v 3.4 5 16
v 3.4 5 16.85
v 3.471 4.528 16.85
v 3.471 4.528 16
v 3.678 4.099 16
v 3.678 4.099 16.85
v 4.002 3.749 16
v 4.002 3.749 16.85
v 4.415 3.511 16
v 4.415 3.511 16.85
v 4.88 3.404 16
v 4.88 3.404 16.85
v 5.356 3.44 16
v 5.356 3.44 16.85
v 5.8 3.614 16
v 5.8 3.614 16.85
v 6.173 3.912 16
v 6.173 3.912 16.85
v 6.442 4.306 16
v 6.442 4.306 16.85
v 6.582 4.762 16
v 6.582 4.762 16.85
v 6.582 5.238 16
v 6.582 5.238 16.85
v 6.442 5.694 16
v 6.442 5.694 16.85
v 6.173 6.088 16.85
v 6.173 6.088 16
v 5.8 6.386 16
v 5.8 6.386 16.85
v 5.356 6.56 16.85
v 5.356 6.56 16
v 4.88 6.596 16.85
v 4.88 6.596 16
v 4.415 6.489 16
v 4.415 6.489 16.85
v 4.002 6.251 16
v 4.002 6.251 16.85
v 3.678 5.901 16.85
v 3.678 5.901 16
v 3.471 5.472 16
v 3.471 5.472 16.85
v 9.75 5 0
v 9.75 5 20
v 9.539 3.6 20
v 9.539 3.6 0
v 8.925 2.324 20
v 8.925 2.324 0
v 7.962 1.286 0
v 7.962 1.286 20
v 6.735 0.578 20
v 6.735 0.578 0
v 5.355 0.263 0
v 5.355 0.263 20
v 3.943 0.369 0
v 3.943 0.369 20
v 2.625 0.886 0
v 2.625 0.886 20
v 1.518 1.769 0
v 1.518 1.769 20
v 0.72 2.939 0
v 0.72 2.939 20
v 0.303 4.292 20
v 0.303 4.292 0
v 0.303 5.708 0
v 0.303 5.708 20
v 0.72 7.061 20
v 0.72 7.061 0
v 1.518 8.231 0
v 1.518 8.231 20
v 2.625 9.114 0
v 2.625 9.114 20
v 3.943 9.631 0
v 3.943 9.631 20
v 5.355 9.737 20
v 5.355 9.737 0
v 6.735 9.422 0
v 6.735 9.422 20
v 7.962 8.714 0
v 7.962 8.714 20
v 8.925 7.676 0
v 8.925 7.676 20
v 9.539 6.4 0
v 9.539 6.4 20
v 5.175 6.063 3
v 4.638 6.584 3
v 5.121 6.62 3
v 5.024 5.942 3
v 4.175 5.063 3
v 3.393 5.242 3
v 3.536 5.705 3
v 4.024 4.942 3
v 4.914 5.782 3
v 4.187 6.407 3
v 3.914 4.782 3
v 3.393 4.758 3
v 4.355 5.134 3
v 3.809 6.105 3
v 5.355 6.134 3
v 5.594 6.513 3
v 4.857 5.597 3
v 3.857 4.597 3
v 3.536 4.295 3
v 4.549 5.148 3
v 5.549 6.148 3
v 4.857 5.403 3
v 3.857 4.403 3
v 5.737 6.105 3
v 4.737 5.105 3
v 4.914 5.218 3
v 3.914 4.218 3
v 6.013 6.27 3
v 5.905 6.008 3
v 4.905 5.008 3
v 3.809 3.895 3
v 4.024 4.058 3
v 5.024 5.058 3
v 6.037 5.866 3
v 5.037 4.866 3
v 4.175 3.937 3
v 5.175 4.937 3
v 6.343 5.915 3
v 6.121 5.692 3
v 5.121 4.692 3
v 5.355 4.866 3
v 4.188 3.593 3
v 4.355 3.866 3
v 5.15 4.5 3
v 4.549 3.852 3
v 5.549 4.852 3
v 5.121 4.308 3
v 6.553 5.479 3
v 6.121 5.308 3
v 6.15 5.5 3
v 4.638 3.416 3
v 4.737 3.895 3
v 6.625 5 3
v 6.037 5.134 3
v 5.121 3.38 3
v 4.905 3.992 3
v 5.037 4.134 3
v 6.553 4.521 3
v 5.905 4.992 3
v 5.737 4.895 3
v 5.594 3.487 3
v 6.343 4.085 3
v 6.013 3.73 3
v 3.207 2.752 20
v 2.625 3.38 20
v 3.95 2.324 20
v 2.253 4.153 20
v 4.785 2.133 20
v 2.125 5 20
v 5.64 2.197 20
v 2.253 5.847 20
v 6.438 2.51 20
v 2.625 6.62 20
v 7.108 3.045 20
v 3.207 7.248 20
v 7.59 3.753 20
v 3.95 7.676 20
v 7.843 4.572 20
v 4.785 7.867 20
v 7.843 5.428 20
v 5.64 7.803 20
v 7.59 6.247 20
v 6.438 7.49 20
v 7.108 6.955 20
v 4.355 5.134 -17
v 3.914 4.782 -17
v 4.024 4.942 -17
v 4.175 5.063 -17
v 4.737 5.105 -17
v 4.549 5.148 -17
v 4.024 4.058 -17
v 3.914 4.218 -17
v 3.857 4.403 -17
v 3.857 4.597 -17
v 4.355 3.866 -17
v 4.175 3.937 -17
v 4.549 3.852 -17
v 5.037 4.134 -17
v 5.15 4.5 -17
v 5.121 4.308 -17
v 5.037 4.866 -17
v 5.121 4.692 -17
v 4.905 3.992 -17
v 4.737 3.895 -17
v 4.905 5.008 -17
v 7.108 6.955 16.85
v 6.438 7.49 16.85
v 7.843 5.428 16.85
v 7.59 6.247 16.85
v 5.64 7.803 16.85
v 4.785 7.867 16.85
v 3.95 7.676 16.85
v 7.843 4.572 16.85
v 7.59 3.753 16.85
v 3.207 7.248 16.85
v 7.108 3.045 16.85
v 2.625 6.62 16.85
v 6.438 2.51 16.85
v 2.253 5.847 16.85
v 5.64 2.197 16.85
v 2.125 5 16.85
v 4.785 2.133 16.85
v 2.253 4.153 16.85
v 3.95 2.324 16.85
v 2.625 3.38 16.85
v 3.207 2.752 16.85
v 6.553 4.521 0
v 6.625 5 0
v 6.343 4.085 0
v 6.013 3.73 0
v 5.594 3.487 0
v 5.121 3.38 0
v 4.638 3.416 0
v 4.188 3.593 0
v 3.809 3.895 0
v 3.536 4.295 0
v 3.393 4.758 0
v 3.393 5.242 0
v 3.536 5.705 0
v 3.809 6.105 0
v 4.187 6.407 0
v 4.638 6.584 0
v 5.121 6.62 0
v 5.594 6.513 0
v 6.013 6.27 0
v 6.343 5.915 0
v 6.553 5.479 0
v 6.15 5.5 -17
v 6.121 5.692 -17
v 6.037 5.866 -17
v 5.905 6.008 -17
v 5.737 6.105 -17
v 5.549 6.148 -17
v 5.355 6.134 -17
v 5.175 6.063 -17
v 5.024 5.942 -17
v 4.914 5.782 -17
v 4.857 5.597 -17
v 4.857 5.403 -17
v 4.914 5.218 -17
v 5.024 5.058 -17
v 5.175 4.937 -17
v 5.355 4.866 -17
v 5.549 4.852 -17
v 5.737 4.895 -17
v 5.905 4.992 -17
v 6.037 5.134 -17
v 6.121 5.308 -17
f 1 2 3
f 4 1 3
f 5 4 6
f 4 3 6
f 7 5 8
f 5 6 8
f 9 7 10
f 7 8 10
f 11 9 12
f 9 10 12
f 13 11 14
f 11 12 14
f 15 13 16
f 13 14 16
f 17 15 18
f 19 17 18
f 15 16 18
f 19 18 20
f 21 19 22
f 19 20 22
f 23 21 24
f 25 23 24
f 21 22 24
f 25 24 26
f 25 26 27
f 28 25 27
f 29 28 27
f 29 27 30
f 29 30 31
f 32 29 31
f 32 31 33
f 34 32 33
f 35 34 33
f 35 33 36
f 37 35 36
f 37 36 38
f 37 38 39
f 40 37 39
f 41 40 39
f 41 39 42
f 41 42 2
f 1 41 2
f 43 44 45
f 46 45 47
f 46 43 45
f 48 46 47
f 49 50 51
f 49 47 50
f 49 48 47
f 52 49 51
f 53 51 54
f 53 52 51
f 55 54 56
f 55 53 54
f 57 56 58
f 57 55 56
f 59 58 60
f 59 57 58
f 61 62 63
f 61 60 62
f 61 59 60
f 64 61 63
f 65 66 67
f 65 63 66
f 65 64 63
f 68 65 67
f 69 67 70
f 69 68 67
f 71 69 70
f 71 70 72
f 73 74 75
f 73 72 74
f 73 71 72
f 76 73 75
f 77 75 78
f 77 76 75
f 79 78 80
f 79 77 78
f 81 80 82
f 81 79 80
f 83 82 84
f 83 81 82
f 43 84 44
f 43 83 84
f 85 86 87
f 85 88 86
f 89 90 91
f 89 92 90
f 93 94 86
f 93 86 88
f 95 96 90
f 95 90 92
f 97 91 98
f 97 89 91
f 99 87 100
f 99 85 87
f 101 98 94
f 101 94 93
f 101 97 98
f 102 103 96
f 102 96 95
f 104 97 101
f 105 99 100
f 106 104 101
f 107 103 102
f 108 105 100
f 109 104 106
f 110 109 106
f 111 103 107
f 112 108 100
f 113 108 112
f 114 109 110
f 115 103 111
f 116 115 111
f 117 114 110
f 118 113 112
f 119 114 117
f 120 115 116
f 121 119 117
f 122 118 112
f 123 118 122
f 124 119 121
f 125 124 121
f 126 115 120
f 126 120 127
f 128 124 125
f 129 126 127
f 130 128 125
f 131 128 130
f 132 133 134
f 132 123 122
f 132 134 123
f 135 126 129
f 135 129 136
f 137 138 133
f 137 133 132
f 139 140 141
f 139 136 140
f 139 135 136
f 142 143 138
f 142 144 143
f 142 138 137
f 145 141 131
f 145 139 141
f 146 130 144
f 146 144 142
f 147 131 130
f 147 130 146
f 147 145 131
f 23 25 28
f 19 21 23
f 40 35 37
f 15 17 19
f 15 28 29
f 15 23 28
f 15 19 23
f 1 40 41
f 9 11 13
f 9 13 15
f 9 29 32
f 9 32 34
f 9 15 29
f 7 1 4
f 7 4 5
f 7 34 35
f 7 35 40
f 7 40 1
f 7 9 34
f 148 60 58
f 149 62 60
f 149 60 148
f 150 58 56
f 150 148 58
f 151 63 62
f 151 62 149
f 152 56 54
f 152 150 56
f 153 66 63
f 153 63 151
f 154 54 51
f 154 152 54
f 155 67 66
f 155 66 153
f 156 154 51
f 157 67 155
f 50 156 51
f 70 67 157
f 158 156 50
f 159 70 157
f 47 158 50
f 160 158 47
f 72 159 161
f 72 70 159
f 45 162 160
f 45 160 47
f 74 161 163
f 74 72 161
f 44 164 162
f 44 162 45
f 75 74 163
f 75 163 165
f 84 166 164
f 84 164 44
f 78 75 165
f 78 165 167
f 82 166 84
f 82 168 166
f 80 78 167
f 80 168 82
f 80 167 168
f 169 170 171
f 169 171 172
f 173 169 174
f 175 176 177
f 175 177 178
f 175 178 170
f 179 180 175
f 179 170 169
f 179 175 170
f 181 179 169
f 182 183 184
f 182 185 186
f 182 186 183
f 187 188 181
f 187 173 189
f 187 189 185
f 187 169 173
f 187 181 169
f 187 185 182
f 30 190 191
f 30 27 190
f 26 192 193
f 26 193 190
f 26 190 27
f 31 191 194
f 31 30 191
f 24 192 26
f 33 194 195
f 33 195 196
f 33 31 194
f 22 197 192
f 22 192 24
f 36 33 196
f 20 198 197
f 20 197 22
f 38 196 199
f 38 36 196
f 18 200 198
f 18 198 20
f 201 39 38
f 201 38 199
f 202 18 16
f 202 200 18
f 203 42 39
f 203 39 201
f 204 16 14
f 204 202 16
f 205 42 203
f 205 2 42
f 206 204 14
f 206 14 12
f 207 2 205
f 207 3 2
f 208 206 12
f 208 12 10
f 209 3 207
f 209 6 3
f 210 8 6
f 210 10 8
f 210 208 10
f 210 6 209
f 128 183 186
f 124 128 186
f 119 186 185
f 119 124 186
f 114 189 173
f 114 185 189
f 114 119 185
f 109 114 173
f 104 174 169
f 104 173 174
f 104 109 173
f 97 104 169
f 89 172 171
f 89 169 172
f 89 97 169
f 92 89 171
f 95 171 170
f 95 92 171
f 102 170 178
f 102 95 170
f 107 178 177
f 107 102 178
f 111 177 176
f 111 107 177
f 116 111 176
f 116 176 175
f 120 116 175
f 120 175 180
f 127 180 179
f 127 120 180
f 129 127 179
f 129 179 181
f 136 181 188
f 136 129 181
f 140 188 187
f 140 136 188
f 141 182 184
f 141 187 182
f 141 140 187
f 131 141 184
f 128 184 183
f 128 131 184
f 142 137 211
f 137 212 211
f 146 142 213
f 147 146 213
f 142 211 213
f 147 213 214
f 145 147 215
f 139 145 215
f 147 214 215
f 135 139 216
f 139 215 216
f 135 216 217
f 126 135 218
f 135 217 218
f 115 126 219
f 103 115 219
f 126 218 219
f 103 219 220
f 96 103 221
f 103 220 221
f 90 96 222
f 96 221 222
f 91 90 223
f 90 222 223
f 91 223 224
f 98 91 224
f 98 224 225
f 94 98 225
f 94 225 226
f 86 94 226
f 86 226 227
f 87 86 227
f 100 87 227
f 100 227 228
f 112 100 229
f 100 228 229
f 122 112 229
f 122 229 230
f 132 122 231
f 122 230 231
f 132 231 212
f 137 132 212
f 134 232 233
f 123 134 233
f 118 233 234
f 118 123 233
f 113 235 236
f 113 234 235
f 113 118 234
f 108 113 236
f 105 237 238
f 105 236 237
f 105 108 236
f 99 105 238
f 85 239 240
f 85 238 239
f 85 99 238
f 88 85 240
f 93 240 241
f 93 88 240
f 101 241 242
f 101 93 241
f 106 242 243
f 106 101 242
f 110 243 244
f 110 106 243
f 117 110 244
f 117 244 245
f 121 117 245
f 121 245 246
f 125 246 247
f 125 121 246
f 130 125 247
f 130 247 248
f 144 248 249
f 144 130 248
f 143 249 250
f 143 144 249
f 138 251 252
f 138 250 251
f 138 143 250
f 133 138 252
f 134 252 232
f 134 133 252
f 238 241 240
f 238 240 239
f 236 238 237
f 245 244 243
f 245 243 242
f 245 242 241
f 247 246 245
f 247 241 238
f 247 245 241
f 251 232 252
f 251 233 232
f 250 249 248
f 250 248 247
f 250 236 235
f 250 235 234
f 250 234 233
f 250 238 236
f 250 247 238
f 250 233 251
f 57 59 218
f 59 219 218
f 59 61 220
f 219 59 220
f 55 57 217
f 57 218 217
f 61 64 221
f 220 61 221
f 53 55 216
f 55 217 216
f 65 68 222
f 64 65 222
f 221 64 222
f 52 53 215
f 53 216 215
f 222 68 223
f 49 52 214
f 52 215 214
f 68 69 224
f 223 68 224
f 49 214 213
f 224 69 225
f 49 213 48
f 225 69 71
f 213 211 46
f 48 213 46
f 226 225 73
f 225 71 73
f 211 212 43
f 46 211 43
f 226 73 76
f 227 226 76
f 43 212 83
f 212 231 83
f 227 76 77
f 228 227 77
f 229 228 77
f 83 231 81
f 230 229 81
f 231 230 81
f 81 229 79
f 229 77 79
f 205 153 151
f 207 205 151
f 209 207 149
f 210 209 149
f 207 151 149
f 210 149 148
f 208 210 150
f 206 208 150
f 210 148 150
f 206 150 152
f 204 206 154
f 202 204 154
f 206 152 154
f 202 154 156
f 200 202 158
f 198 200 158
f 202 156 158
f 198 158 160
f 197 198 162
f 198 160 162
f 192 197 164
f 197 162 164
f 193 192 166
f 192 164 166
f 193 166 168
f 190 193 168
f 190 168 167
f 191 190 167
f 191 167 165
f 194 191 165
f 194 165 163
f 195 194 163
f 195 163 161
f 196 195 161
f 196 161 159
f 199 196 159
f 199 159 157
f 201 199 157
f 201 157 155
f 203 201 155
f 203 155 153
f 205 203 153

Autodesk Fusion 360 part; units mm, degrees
sketch "Sketch1" plane through (0, 0, 0) normal (0, 0, 1) x (1, 0, 0)
  circle A0 centre (5, 5) radius 4.75
  dimension "d1" = 9.5
extrude "Extrude1" add sketch "Sketch1" along normal blind 20
sketch "Sketch2" plane through (0, 0, 20) normal (0, 0, 1) x (-1, 0, 0)
  circle A0 centre (-5, -5) radius 4.75
  circle A1 centre (-5, -5) radius 2.875
  dimension "d4" = 5.75
extrude "Extrude2" cut sketch "Sketch2" against normal blind 3.15 contours A1
sketch "Sketch3" plane through (0, 0, 16.85) normal (0, 0, 1) x (-1, 0, 0)
  circle A0 centre (-5, -5) radius 2.875
  circle A1 centre (-5, -5) radius 1.6
  dimension "d7" = 3.2
extrude "Extrude3" cut sketch "Sketch3" against normal blind 0.85 contours A1
sketch "Sketch4" plane through (0, 0, 0) normal (0, 0, -1) x (1, 0, 0)
  circle A0 centre (5, -5) radius 4.75
  circle A1 centre (5, -5) radius 1.625
  dimension "d10" = 3.25
extrude "Extrude4" cut sketch "Sketch4" against normal blind 3 contours A1
sketch "Sketch6" plane through (0, 0, 3) normal (0, 0, -1) x (1, 0, 0)
  circle A0 centre (5, -5) radius 1.625
  circle A1 centre (4.5, -4.5) radius 0.65
  circle A2 centre (5.5, -5.5) radius 0.65
  dimension "d13" = 1.3
  dimension "d14" = 1.3
sketch "Sketch7" plane through (0, 0, 0) normal (0, 0, -1) x (1, 0, 0)
  circle A0 centre (5, -5) radius 1.625
  circle A1 centre (5, -5) radius 4.75
extrude "Extrude5" add sketch "Sketch6" along normal blind 20 contours A1
extrude "Extrude6" add sketch "Sketch6" along normal blind 20 contours A2
